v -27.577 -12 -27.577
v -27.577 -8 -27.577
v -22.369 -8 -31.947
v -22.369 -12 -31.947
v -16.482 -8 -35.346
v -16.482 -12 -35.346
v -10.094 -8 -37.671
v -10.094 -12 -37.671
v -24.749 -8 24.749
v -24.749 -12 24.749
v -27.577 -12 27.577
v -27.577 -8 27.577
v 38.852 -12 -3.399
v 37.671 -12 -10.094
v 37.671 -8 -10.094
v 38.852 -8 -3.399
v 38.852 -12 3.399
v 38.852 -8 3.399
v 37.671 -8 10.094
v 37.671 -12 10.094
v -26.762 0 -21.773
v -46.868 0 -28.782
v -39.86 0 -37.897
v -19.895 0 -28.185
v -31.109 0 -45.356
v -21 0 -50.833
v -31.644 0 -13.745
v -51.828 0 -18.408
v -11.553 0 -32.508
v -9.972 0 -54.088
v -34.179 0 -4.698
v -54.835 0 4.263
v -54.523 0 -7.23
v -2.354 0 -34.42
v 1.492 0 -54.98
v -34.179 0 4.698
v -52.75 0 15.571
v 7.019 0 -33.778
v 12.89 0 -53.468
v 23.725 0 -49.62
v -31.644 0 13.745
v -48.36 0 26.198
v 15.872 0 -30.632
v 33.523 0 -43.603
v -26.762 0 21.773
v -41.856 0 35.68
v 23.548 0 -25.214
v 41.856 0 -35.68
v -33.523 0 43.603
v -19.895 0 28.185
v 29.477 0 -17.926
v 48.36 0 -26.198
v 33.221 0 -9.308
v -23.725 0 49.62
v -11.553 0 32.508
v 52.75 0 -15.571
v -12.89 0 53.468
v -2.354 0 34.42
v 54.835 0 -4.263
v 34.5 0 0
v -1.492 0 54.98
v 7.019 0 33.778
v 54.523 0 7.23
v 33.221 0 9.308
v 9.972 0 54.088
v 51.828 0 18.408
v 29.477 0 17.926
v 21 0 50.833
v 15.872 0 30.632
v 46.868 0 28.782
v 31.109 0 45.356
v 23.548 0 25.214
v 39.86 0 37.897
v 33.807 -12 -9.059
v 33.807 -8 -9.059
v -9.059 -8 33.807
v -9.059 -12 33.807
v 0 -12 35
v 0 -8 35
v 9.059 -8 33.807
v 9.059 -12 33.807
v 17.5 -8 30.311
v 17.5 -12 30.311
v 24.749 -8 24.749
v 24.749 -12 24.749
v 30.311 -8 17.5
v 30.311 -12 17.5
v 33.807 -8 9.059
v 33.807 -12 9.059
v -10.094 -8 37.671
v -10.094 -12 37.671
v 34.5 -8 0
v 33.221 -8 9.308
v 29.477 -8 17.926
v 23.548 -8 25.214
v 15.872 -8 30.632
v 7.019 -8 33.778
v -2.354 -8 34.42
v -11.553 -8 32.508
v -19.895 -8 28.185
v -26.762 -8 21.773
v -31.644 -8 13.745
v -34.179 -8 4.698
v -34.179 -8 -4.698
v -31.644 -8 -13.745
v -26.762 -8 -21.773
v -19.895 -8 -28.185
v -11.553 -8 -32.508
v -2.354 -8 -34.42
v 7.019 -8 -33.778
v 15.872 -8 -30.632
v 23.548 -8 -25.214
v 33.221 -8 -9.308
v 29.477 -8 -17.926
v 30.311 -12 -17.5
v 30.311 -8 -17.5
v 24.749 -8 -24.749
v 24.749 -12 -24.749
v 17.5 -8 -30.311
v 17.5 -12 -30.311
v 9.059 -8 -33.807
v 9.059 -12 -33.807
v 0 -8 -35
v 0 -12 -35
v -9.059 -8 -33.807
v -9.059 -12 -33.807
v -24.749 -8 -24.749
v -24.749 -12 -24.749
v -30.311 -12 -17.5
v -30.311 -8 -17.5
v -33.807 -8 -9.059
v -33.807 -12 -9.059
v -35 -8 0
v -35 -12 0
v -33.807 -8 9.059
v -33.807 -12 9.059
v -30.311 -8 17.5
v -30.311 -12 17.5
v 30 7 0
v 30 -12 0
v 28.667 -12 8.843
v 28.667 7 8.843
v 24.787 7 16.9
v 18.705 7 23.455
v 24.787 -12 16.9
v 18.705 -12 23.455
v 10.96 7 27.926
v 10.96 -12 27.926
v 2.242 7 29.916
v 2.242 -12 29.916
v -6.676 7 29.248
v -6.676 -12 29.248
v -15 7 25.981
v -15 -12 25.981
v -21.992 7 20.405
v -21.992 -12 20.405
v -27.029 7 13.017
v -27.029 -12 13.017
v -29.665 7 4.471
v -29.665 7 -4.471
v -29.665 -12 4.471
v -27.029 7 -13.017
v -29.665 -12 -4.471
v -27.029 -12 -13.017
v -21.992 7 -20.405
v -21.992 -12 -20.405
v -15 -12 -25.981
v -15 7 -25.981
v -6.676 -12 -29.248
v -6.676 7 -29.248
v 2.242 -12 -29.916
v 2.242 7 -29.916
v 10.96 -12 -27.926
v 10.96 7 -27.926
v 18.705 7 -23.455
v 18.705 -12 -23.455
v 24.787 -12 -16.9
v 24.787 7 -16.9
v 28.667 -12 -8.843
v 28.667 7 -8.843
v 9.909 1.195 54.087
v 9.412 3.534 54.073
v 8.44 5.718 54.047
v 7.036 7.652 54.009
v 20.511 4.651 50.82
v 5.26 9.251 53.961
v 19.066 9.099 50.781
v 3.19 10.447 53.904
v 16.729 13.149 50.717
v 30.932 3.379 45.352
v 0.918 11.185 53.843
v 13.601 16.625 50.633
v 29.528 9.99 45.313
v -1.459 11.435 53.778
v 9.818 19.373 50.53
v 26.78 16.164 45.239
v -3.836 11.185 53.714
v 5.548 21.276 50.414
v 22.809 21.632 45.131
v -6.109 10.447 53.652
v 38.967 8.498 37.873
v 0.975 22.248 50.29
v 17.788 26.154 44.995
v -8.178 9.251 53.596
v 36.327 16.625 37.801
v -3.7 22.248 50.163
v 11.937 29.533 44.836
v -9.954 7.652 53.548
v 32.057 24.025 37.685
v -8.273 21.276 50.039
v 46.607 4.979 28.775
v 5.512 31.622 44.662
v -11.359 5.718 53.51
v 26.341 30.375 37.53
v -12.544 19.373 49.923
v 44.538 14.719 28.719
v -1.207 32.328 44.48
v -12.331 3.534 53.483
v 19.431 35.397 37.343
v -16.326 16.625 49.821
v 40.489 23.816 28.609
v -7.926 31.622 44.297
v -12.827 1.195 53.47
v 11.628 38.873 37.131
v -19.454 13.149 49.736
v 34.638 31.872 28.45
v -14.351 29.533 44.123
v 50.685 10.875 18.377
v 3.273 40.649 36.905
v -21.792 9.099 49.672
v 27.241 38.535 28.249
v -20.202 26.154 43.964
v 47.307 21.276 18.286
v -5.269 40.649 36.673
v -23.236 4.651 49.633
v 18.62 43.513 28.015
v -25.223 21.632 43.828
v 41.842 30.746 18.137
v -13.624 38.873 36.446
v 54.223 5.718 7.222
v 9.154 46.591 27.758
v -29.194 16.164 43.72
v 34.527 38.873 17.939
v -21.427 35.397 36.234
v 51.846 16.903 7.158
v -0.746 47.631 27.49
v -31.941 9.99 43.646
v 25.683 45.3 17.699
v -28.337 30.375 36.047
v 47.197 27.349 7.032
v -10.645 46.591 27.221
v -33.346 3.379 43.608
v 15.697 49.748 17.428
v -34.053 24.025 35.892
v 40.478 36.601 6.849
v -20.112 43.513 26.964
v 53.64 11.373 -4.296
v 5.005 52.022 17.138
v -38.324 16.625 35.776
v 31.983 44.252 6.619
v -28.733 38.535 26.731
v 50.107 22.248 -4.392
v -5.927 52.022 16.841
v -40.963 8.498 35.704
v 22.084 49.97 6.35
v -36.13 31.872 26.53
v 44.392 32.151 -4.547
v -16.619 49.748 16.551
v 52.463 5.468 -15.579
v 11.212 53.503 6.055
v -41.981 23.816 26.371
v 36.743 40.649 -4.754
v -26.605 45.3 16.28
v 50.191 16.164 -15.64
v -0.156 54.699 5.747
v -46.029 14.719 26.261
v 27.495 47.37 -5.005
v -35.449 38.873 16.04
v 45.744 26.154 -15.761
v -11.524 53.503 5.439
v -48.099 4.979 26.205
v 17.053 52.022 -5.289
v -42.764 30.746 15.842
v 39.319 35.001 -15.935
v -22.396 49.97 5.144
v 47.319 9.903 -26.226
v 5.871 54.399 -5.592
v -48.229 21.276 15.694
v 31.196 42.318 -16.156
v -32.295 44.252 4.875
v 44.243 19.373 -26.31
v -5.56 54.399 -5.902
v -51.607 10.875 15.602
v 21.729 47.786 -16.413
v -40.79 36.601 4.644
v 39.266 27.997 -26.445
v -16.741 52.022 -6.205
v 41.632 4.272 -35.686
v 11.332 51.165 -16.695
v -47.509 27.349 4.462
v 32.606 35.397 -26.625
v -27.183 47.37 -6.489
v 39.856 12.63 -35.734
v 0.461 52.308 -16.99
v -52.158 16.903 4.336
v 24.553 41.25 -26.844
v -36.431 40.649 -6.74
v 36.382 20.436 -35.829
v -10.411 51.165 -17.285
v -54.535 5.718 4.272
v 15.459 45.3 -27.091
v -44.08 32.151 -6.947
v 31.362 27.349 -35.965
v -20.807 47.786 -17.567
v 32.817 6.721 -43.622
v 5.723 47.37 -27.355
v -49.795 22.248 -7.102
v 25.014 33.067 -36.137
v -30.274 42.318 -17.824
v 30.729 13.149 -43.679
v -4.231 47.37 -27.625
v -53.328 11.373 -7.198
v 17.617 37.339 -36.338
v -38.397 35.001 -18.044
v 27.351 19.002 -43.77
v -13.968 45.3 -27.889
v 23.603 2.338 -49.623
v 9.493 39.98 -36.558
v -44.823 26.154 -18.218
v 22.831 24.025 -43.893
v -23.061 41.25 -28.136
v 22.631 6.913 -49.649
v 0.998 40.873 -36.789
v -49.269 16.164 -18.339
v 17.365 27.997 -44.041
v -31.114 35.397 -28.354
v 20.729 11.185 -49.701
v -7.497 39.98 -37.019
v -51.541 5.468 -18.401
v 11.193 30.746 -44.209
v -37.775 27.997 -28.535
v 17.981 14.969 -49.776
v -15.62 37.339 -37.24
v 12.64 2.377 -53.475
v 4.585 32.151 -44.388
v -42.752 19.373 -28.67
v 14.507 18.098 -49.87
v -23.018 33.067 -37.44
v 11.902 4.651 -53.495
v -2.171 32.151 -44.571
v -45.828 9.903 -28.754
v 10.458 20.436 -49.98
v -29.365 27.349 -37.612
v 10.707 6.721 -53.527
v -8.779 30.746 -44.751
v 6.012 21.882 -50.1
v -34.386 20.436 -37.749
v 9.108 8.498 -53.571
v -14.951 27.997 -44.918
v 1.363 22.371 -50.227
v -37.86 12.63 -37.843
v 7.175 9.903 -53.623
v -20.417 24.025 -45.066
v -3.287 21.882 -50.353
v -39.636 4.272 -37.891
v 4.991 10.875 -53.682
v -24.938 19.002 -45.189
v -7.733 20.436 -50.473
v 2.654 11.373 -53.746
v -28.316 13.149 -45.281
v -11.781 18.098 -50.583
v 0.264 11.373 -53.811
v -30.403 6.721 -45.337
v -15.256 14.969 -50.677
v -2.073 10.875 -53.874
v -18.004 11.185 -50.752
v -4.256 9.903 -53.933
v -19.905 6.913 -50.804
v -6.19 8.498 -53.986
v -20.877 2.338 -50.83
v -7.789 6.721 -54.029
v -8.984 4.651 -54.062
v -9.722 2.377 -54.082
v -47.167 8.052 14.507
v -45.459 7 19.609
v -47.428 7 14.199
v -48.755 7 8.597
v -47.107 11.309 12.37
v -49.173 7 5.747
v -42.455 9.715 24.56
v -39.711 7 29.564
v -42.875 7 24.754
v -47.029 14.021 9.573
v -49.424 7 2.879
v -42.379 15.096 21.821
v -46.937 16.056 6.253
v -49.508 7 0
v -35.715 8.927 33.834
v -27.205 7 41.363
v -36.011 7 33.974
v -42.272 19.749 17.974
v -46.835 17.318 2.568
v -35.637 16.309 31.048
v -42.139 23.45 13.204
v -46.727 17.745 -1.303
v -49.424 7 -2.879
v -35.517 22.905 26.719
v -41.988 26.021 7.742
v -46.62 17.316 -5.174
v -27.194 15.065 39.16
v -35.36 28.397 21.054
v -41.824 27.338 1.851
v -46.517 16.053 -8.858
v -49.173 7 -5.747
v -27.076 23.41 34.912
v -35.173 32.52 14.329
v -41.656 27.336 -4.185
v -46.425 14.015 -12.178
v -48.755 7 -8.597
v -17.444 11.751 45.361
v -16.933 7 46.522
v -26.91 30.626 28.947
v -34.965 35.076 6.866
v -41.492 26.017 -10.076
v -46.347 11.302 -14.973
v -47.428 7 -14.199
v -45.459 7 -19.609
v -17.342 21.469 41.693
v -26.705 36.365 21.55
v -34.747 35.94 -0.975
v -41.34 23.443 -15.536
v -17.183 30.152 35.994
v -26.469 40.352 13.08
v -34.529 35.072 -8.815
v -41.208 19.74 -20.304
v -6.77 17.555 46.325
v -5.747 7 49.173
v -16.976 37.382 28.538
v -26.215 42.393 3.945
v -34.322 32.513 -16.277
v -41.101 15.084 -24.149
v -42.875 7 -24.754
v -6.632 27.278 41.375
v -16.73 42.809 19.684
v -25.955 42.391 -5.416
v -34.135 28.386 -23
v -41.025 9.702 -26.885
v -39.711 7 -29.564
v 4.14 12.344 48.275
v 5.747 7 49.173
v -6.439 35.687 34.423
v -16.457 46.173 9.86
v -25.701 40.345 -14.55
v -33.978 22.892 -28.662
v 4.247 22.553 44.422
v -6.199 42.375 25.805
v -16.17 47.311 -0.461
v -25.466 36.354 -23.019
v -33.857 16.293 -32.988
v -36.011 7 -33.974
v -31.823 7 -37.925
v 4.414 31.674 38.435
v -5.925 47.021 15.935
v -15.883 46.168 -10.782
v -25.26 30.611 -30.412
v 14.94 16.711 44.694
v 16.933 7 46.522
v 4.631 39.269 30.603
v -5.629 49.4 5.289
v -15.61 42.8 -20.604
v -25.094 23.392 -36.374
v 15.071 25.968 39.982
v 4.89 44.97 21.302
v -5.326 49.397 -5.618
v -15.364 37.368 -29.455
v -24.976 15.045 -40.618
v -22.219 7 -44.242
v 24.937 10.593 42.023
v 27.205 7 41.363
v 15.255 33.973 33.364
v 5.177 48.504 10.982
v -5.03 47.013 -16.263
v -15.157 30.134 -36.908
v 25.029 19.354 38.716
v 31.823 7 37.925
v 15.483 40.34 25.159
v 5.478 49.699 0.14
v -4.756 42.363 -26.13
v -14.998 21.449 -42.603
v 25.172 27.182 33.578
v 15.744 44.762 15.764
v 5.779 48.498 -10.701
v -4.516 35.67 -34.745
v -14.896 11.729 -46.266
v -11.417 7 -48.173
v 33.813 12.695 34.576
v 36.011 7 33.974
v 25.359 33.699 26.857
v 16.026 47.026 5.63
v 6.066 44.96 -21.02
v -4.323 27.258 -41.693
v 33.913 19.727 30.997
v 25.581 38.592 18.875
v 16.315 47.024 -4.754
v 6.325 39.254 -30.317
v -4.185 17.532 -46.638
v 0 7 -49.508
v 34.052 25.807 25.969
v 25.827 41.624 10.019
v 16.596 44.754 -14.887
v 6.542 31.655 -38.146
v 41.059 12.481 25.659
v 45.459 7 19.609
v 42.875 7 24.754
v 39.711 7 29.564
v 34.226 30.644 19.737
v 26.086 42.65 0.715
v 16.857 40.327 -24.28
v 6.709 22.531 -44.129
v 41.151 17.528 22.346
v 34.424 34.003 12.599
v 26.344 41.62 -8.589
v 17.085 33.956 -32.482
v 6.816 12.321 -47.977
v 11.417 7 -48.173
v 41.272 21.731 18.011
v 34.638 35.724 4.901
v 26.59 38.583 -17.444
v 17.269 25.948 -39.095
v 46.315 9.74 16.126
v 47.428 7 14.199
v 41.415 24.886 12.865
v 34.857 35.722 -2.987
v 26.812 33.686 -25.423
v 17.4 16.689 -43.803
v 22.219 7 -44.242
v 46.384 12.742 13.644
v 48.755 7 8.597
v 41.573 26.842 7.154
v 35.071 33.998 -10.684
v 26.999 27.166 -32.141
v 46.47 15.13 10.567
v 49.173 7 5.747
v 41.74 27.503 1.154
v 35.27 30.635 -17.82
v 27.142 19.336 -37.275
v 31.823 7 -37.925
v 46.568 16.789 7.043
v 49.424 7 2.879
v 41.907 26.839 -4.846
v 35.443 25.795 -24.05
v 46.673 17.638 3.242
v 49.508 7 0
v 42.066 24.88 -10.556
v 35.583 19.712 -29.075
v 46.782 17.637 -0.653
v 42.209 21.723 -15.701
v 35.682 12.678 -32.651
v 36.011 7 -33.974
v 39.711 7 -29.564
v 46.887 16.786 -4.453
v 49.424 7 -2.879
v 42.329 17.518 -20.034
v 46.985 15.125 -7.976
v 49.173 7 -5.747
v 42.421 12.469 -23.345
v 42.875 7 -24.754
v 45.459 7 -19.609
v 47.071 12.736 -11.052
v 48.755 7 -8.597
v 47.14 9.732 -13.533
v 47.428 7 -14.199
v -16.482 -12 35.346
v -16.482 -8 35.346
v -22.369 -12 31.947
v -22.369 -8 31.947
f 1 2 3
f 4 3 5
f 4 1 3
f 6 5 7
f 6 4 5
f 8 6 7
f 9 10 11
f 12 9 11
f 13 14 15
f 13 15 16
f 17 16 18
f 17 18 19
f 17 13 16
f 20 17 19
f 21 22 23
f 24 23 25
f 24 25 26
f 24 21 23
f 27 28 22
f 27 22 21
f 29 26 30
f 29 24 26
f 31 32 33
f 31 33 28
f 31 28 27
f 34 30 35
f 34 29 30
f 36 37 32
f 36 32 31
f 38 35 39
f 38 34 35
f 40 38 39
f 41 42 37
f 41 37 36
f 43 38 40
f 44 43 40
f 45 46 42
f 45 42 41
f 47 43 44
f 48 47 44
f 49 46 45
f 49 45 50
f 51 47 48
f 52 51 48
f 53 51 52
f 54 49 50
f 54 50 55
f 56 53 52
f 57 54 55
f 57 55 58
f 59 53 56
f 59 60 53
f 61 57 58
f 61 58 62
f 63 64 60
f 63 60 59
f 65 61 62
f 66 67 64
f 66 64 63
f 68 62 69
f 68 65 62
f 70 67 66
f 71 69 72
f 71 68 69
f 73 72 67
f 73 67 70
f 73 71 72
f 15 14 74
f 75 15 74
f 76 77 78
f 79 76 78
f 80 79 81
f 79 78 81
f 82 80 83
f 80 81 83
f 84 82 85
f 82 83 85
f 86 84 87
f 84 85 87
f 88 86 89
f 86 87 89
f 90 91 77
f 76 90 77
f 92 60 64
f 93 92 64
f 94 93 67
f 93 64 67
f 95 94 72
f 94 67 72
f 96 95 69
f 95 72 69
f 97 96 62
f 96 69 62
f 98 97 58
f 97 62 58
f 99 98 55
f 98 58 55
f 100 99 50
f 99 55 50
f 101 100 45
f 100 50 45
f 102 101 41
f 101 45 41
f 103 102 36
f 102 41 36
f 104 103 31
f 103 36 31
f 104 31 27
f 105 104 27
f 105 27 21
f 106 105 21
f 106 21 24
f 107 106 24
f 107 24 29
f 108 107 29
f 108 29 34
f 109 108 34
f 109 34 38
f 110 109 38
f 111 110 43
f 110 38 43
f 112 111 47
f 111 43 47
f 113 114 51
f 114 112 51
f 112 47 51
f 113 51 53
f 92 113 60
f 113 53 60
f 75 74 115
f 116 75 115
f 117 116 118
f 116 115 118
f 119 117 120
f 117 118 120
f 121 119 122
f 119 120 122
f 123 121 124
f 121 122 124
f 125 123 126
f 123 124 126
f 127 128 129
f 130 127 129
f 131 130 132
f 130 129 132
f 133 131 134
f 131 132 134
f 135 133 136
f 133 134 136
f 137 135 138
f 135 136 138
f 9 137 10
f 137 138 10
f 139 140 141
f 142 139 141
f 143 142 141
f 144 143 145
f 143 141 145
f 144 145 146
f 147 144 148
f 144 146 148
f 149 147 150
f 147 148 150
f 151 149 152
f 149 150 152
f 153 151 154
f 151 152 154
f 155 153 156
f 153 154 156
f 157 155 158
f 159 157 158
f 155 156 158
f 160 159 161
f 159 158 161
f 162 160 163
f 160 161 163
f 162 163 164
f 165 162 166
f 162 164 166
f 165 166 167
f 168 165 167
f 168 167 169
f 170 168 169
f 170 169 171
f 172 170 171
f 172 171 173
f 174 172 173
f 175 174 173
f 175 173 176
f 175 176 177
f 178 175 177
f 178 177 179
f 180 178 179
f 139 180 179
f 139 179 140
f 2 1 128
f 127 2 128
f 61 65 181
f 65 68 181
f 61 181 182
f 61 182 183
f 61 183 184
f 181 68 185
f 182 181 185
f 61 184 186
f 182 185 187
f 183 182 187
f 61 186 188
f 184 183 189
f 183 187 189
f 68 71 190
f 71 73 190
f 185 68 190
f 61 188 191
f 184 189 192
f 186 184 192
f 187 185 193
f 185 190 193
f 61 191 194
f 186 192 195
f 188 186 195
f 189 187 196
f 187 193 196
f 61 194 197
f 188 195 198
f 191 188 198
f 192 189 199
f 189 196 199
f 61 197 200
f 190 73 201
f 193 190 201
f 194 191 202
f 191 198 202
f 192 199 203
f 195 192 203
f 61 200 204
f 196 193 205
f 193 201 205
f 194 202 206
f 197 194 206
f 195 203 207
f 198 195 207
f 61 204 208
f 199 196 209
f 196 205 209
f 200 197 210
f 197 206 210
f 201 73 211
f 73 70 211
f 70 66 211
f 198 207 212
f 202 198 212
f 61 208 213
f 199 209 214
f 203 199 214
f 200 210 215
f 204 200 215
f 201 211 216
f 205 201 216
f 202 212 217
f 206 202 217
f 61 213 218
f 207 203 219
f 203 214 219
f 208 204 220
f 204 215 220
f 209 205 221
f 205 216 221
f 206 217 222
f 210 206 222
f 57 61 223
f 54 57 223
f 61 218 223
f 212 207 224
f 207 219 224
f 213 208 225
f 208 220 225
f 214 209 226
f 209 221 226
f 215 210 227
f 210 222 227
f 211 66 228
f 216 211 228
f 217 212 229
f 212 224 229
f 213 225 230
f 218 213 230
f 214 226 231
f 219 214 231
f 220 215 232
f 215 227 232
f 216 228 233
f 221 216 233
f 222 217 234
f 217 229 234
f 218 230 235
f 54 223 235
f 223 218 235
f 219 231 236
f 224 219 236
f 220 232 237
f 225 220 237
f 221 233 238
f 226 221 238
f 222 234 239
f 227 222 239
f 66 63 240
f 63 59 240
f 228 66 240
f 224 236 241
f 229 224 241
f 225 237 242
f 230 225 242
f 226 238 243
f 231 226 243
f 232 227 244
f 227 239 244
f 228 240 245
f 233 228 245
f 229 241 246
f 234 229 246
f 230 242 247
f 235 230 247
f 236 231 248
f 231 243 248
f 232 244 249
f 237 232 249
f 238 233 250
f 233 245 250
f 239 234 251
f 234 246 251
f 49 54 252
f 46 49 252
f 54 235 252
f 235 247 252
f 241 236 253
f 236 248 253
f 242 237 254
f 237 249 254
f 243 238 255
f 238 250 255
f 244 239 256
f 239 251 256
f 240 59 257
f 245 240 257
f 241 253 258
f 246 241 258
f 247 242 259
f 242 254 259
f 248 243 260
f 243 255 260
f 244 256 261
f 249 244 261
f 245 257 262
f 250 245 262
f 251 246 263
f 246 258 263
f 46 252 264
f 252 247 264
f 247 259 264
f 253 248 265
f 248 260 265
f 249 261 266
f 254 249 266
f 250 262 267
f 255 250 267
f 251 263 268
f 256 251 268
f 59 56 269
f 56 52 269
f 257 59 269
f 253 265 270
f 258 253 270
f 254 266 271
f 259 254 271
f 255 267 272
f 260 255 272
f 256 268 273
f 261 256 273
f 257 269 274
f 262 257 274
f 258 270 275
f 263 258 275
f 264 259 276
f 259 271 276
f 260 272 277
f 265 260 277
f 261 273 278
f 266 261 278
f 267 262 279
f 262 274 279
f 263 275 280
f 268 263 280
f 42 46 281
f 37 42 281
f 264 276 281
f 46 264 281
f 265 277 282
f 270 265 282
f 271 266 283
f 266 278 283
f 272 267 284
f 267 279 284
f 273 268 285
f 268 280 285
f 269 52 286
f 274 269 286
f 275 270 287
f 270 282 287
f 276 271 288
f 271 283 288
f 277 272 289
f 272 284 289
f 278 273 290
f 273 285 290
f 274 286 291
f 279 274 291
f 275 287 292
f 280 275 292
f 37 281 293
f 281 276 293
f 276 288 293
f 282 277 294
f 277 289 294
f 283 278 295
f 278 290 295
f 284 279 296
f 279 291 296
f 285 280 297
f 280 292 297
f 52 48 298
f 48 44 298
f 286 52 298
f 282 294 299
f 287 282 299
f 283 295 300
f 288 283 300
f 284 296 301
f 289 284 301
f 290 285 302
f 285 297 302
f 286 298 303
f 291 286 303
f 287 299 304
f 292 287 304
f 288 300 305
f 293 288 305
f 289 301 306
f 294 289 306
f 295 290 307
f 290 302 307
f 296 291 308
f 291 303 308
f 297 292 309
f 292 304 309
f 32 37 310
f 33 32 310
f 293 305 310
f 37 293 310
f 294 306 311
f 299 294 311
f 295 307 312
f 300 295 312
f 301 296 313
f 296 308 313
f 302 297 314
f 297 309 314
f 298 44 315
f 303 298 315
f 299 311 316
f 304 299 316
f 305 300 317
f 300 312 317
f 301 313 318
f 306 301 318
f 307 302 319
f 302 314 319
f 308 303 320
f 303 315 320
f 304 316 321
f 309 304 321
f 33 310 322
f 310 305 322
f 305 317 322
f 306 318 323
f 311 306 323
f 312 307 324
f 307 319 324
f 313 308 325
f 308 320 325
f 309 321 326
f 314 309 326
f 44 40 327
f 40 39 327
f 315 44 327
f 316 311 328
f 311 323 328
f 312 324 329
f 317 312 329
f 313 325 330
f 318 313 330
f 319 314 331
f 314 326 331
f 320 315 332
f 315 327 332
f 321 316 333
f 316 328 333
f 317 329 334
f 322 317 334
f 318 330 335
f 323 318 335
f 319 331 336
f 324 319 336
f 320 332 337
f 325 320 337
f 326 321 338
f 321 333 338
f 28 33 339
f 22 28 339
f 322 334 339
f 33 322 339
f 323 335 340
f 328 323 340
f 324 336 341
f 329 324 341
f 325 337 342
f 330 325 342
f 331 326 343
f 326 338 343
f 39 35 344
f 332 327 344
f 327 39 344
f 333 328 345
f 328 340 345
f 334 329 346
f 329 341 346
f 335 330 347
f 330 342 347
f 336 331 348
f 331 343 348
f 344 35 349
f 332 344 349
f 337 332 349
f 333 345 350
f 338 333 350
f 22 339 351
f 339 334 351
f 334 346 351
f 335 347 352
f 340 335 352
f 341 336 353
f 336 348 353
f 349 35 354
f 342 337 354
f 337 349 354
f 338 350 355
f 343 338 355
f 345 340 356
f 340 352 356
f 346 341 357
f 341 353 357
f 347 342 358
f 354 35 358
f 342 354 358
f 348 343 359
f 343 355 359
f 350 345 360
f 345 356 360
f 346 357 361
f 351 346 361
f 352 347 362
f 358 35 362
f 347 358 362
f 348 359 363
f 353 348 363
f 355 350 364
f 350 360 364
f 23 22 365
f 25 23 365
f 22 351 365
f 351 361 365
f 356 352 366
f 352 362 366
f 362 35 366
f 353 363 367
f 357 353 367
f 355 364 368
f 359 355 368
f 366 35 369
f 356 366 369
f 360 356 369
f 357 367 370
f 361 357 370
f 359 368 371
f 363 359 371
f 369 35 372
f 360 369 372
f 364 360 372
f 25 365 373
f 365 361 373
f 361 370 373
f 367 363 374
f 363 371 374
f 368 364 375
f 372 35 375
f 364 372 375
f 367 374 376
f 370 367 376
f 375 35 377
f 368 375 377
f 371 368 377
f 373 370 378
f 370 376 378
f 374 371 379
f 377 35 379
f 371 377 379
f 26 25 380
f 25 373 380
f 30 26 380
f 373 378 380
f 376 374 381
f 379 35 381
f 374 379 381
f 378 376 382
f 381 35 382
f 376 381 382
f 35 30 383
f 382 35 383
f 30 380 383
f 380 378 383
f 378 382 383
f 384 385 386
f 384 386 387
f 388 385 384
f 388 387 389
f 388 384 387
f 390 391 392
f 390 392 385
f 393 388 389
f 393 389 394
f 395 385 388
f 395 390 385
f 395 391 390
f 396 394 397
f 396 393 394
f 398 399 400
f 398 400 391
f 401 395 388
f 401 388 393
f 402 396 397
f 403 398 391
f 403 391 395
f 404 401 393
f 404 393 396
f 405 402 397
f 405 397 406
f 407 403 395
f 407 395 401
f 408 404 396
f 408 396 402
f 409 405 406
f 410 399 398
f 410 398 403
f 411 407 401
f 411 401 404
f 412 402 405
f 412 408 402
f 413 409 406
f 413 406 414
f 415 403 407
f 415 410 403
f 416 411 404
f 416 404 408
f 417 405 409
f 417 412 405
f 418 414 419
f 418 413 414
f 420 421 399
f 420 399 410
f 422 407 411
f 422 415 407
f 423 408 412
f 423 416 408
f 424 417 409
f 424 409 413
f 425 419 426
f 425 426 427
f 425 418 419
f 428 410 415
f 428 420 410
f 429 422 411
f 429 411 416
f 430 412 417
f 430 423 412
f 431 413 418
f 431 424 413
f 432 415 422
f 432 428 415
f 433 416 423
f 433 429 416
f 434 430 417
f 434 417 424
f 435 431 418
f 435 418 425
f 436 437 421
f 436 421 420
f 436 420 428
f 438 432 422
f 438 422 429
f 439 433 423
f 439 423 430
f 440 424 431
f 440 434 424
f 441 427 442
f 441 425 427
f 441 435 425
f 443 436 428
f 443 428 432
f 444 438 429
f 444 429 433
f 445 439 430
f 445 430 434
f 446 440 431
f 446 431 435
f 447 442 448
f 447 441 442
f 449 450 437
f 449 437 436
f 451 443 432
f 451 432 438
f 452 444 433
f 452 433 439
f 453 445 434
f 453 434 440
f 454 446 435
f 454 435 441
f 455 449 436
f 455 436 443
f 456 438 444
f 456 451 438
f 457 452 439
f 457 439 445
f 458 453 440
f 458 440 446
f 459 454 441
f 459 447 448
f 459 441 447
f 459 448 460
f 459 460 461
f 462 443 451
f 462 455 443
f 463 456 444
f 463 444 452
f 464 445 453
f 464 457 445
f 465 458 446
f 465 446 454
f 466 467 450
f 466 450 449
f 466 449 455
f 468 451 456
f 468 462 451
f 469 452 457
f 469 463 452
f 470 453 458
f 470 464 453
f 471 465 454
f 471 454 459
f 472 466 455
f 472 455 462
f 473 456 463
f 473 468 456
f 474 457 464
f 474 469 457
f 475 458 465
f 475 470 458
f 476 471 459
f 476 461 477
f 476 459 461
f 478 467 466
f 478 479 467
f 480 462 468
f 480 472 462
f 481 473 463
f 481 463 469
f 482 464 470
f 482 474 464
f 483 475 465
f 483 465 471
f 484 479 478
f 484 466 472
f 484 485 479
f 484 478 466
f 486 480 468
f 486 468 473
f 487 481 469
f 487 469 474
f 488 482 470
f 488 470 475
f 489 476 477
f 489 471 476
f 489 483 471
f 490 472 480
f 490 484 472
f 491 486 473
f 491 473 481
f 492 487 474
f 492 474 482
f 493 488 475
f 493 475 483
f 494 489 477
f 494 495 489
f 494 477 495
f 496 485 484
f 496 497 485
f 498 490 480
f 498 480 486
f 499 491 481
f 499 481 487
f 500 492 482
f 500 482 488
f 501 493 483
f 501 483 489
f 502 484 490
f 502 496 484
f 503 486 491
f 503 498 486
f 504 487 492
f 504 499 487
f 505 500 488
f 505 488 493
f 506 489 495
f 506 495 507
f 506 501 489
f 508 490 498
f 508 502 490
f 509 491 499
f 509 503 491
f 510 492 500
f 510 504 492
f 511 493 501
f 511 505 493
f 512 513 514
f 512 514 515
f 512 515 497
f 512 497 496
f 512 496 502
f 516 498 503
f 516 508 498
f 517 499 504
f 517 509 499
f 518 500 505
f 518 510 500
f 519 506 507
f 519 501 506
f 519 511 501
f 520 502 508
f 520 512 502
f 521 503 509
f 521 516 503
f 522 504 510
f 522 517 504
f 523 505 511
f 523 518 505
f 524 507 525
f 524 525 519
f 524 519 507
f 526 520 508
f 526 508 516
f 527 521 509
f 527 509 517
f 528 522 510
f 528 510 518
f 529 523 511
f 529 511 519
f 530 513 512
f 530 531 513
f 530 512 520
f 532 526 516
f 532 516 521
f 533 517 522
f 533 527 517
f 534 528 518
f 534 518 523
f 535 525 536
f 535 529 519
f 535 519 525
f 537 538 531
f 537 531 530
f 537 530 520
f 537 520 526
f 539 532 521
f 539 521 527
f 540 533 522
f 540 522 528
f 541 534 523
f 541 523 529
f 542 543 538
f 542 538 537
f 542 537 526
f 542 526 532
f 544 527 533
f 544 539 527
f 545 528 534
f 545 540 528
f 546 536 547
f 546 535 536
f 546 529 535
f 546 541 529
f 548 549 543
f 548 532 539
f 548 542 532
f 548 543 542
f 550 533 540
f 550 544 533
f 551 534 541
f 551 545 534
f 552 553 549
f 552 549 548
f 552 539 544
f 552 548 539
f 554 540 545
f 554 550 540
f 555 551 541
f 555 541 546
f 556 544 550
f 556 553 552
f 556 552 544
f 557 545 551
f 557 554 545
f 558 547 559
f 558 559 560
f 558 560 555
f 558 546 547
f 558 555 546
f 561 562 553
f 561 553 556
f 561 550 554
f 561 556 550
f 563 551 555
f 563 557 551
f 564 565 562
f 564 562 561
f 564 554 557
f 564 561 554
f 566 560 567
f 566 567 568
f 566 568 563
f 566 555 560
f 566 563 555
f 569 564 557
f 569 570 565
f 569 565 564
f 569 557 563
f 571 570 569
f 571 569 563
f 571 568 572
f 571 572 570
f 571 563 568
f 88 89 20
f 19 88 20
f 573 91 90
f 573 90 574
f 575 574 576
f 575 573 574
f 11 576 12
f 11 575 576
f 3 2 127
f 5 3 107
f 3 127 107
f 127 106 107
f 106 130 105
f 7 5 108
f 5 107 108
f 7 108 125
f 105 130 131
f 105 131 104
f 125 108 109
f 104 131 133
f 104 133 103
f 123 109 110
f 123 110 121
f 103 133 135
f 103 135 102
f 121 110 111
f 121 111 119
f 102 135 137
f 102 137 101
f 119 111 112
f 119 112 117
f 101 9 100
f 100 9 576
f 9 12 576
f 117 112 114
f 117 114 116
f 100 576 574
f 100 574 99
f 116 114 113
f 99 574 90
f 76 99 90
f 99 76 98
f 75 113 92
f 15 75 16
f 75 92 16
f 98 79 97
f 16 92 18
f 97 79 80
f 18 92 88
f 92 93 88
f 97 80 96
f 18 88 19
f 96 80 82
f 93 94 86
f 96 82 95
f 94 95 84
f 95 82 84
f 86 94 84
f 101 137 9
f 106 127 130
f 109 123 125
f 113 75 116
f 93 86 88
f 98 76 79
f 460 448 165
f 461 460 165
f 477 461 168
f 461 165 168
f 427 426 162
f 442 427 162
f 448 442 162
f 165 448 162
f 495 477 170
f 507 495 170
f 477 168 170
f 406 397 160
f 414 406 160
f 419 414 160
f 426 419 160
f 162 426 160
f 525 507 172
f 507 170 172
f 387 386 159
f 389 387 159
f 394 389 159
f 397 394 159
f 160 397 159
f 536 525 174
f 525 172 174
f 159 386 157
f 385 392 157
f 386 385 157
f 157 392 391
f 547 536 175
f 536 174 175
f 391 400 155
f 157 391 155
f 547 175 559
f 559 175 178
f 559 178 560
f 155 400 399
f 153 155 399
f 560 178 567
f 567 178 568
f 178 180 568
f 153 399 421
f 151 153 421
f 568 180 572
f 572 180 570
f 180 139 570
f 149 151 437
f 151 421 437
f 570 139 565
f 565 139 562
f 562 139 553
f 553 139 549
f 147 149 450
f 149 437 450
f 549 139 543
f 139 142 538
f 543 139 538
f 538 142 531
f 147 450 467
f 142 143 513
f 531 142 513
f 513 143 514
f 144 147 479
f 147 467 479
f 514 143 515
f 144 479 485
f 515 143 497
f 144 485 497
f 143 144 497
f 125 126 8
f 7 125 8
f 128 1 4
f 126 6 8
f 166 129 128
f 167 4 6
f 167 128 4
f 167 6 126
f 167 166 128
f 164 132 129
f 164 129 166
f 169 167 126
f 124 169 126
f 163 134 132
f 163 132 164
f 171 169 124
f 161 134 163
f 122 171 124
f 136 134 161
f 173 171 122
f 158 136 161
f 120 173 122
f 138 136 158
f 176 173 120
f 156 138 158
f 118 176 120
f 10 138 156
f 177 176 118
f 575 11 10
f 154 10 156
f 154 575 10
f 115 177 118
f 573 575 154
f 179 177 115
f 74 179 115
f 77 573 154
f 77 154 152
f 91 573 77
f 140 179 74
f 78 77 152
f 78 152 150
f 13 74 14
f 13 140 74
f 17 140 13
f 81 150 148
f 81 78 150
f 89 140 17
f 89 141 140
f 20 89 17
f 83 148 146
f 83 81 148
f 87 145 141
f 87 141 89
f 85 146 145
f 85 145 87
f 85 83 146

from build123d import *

# Parameters (mm, degrees)
REVOLVE1_ANGLE      = 180
SKETCH4_R           = 50
BOSS_EXTRUDE1_DEPTH = 7
SKETCH5_R           = 34.5
BOSS_EXTRUDE2_DEPTH = 12
SKETCH6_R           = 39
BOSS_EXTRUDE4_DEPTH = 4
SKETCH7_R           = 30
CUT_EXTRUDE1_DEPTH  = 24
CUT_EXTRUDE2_DEPTH  = 10


with BuildPart() as part:
    # Sketch1 → Revolve1 (revolve)
    with BuildSketch(Plane(origin=(0, 0, 0), x_dir=(1, 0, 0), z_dir=(0, 1, 0))):
        with BuildLine():
            Line((1.491717845, 54.979766986), (-1.491717845, -54.979766986))
            ThreePointArc((-1.491717845, -54.979766986), (54.979766986, -1.491717845), (1.491717845, 54.979766986))
        make_face()
    revolve(axis=Axis((1.491717845, 0, -54.979766986), (-0.027122143, 0, 0.999632127)), revolution_arc=REVOLVE1_ANGLE)

    # Sketch2 → Cut-Revolve1 (revolve, cut)
    with BuildSketch(Plane.XZ):
        with BuildLine():
            Line((49.980692072, 1.389395568), (-49.980692072, -1.389395568))
            ThreePointArc((-49.980692072, -1.389395568), (-1.389395568, 49.980692072), (49.980692072, 1.389395568))
        make_face()
    revolve(axis=Axis((49.980692072, 0, 1.389395568), (-0.999613841, 0, -0.027787911)), mode=Mode.SUBTRACT)

    # Sketch4 → Boss-Extrude1 (add)
    with BuildSketch(Plane.XZ):
        Circle(SKETCH4_R)
    extrude(amount=-BOSS_EXTRUDE1_DEPTH)

    # Sketch5 → Boss-Extrude2 (add)
    with BuildSketch(Plane.XZ):
        Circle(SKETCH5_R)
    extrude(amount=BOSS_EXTRUDE2_DEPTH)

    # Sketch6 → Boss-Extrude4 (add)
    with BuildSketch(Plane.XZ.offset(12)):
        Circle(SKETCH6_R)
    extrude(amount=-BOSS_EXTRUDE4_DEPTH)

    # Sketch7 → Cut-Extrude1 (cut)
    with BuildSketch(Plane.XZ.offset(12)):
        Circle(SKETCH7_R)
    extrude(amount=-CUT_EXTRUDE1_DEPTH, mode=Mode.SUBTRACT)

    # Sketch8 → Cut-Extrude2 (cut)
    with BuildSketch(Plane.XZ.offset(12)):
        with BuildLine():
            ThreePointArc((37.671107225, 10.093942759), (19.5, 33.774990748), (-10.093942759, 37.671107225))
            Line((-10.093942759, 37.671107225), (-9.058666579, 33.80740392))
            ThreePointArc((-9.058666579, 33.80740392), (17.5, 30.310889132), (33.80740392, 9.058666579))
            Line((33.80740392, 9.058666579), (37.671107225, 10.093942759))
        make_face()
        with BuildLine():
            ThreePointArc((-10.093942759, -37.671107225), (19.5, -33.774990748), (37.671107225, -10.093942759))
            Line((37.671107225, -10.093942759), (33.80740392, -9.058666579))
            ThreePointArc((33.80740392, -9.058666579), (17.5, -30.310889132), (-9.058666579, -33.80740392))
            Line((-9.058666579, -33.80740392), (-10.093942759, -37.671107225))
        make_face()
        with BuildLine():
            Line((-24.748737342, 24.748737342), (-27.577164466, 27.577164466))
            ThreePointArc((-27.577164466, 27.577164466), (-39, 0), (-27.577164466, -27.577164466))
            Line((-27.577164466, -27.577164466), (-24.748737342, -24.748737342))
            ThreePointArc((-24.748737342, -24.748737342), (-35, 0), (-24.748737342, 24.748737342))
        make_face()
    extrude(amount=-CUT_EXTRUDE2_DEPTH, mode=Mode.SUBTRACT)


solid = part.part
